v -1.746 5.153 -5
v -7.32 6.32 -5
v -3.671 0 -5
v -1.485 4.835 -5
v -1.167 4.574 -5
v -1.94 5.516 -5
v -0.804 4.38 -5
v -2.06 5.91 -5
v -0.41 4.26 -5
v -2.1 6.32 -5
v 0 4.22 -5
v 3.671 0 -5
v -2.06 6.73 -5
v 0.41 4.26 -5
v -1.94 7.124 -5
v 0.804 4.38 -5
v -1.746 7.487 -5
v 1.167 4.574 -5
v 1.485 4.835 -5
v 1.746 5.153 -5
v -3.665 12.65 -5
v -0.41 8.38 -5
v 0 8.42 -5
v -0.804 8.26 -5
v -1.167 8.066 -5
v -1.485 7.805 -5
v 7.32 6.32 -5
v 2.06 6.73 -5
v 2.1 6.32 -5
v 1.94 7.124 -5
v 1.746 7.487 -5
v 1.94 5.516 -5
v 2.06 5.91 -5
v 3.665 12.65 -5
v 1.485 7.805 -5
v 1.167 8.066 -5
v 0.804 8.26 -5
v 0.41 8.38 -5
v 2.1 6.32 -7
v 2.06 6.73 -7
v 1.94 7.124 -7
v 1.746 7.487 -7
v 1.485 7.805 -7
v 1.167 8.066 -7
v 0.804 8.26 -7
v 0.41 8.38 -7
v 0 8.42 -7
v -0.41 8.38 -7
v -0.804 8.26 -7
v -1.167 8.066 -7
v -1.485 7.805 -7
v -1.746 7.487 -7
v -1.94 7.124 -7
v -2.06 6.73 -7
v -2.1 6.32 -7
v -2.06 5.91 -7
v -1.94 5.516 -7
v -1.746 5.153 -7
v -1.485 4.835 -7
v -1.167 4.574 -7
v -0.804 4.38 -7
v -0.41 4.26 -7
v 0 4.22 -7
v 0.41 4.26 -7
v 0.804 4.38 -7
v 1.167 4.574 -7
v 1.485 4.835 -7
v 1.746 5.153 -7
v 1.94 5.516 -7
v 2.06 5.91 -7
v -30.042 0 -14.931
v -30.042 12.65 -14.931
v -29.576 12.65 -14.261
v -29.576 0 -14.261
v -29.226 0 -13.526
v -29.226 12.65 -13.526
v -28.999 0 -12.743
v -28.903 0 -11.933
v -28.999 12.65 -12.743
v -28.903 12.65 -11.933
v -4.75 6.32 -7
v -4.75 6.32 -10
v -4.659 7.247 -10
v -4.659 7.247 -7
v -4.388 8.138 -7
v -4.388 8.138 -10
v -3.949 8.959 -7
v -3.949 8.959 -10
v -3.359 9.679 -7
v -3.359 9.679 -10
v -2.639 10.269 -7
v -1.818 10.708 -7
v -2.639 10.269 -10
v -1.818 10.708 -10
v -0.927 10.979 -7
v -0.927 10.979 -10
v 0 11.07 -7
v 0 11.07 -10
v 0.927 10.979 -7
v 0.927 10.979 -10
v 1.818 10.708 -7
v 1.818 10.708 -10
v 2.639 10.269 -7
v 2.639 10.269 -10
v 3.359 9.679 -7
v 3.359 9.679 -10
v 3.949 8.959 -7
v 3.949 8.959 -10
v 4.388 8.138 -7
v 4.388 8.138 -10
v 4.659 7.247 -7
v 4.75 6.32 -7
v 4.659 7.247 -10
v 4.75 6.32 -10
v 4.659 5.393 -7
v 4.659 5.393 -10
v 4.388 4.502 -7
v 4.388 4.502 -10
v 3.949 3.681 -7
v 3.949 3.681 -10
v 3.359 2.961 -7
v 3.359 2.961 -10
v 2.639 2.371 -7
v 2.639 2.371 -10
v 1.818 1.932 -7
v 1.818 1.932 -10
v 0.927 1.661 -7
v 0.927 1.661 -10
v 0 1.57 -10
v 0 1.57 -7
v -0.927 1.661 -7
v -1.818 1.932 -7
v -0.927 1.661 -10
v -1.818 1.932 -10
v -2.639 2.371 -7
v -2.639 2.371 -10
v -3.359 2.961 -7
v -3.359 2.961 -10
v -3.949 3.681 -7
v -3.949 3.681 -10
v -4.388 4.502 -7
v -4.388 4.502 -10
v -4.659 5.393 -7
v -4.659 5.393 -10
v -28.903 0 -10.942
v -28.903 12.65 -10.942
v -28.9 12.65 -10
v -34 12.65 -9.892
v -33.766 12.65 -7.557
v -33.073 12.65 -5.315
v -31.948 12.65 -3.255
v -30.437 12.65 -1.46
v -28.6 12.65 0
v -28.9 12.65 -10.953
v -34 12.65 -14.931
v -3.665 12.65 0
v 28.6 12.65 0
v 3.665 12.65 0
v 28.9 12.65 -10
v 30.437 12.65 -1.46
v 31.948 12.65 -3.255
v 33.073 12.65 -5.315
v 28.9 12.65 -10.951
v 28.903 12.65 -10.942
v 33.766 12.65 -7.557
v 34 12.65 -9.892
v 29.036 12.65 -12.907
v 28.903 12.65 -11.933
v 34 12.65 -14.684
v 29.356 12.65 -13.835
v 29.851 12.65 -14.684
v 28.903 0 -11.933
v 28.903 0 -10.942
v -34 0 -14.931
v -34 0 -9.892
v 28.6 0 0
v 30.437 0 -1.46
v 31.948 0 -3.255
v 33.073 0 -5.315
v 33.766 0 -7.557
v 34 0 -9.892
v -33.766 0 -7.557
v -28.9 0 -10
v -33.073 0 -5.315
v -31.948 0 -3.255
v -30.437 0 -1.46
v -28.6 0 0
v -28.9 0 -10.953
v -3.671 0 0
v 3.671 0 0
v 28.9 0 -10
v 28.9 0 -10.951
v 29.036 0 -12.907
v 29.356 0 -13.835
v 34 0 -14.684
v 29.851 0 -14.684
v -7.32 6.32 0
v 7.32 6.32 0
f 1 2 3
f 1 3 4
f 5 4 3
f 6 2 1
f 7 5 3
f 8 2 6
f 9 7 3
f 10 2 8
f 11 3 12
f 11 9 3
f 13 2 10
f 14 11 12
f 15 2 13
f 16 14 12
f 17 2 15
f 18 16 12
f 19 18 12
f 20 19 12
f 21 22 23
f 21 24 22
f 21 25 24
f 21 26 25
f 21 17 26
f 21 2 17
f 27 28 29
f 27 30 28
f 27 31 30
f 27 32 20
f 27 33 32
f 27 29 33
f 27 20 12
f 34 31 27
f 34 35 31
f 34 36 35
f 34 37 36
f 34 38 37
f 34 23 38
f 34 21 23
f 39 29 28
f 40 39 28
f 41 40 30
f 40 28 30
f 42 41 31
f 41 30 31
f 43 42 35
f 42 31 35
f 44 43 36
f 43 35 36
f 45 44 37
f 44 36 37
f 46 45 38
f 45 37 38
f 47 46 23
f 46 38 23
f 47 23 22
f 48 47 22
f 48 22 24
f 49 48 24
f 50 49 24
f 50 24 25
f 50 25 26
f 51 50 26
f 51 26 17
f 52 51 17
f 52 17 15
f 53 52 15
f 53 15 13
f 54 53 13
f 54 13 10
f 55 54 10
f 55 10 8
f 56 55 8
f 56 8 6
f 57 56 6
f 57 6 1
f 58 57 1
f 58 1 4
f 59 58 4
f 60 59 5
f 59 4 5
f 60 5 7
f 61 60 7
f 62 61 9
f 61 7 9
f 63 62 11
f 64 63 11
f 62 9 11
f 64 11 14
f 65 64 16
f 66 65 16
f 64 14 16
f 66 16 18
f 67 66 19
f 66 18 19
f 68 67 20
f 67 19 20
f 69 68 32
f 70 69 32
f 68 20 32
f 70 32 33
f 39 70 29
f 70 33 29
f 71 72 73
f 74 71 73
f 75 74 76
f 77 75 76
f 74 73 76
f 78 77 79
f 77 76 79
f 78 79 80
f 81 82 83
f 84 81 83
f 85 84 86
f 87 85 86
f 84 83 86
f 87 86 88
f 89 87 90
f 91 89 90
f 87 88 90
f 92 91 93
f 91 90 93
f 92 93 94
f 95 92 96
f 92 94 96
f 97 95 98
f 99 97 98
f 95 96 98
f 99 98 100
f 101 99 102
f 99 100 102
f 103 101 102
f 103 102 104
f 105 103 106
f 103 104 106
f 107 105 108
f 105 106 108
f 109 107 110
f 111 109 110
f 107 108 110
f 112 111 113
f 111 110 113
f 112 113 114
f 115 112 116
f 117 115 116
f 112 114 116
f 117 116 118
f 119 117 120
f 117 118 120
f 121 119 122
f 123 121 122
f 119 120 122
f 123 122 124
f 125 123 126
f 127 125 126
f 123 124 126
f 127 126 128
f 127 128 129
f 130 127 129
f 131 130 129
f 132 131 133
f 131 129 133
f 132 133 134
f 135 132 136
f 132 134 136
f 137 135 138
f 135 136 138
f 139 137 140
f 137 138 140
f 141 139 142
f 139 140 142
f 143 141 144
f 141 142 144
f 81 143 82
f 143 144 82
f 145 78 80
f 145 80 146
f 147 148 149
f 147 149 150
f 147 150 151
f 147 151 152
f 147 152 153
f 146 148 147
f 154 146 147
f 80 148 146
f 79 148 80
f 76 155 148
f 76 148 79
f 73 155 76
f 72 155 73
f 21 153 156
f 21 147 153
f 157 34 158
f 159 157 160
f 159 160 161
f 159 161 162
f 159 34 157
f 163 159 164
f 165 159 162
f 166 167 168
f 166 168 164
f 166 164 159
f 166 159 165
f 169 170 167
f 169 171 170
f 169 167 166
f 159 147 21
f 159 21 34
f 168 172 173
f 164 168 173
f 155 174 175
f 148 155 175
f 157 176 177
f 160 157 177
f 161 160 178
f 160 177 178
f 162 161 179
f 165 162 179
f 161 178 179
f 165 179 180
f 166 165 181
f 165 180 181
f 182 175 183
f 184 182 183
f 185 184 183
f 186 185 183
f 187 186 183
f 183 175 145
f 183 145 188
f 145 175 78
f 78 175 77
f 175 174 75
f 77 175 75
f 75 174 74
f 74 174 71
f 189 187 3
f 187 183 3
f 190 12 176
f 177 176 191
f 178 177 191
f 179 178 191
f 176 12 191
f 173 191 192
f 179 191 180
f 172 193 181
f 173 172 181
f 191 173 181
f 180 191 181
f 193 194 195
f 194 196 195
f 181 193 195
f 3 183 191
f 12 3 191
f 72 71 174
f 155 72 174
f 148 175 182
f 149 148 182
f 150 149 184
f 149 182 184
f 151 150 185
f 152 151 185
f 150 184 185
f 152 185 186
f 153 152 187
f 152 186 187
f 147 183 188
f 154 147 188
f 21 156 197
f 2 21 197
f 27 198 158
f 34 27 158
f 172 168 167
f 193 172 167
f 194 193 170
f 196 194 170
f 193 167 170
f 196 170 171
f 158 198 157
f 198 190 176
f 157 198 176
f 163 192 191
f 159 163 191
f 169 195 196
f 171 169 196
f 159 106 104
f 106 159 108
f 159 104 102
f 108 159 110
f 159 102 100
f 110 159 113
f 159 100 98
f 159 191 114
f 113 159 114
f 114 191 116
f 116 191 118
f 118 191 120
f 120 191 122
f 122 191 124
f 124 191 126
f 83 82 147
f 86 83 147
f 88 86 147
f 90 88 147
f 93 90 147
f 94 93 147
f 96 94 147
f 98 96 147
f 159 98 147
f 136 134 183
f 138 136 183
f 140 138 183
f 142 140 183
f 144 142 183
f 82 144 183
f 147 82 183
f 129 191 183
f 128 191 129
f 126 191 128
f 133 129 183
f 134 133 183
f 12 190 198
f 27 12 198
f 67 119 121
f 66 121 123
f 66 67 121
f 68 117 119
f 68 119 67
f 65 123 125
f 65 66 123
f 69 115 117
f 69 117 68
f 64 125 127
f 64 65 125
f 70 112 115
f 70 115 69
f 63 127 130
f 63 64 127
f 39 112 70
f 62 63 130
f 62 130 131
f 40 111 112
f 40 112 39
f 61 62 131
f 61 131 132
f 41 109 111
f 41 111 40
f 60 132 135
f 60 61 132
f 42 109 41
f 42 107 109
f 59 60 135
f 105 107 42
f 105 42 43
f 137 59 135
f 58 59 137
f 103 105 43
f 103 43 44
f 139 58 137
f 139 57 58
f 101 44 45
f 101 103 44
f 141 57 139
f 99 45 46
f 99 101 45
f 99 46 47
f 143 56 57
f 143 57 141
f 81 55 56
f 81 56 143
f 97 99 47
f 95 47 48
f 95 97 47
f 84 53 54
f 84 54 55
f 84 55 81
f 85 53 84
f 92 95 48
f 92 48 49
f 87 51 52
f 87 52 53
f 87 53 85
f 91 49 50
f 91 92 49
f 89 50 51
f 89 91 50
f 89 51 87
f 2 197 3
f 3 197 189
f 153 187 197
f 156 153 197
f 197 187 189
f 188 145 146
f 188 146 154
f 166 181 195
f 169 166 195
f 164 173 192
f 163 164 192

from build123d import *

# Parameters (mm, degrees)
EXTRUDE_1_DEPTH     = 12.65
CUT_EXTRUDE_1_DEPTH = 5
SKETCH_3_R          = 4.75
CUT_EXTRUDE_2_DEPTH = 3
SKETCH_6_R          = 2.1
CUT_EXTRUDE_5_DEPTH = 10
FILLET_3_R          = 5
FILLET_4_R          = 5
FILLET_6_R          = 1
FILLET_7_R          = 1
CUT_EXTRUDE_6_DEPTH = 15


with BuildPart() as part:
    # 草图1 → 凸台-拉伸1 (new body)
    with BuildSketch(Plane(origin=(0, 0, 0), x_dir=(1, 0, 0), z_dir=(0, 1, 0))):
        with BuildLine():
            Line((-28.6, 0), (28.6, 0))
            ThreePointArc((28.6, 0), (32.562096374, 4.25705164), (34, 9.892043165))
            Line((34, 9.892043165), (34, 17.266133288))
            Line((34, 17.266133288), (28.9, 15))
            Line((28.9, 15), (28.9, 10))
            Line((28.9, 10), (-28.9, 10))
            Line((-28.9, 10), (-28.9, 15))
            Line((-28.9, 15), (-34, 17.266133288))
            Line((-34, 17.266133288), (-34, 9.892043165))
            ThreePointArc((-34, 9.892043165), (-32.562096374, 4.25705164), (-28.6, 0))
        make_face()
    extrude(amount=EXTRUDE_1_DEPTH)

    # 草图2 → 切除-拉伸1 (cut)
    with BuildSketch(Plane.XY):
        Polygon((-7.32, 6.32), (-3.66, -0.019305956), (3.66, -0.019305956), (7.32, 6.32), (3.66, 12.659305956), (-3.66, 12.659305956), align=None)
    extrude(amount=-CUT_EXTRUDE_1_DEPTH, mode=Mode.SUBTRACT)

    # 草图3 → 切除-拉伸2 (cut)
    with BuildSketch(Plane(origin=(0, 0, -10), x_dir=(-1, 0, 0), z_dir=(0, 0, -1))):
        with Locations((0, 6.32)):
            Circle(SKETCH_3_R)
    extrude(amount=-CUT_EXTRUDE_2_DEPTH, mode=Mode.SUBTRACT)

    # 草图6 → 切除-拉伸5 (cut)
    with BuildSketch(Plane.XY.offset(-5)):
        with Locations((0, 6.32)):
            Circle(SKETCH_6_R)
    extrude(amount=-CUT_EXTRUDE_5_DEPTH, mode=Mode.SUBTRACT)

    # 圆角3
    fillet_3_edges = [part.edges().sort_by_distance(p)[0] for p in [
        (-28.9, 6.325, -15),
    ]]
    fillet(fillet_3_edges, radius=FILLET_3_R)

    # 圆角4
    fillet_4_edges = [part.edges().sort_by_distance(p)[0] for p in [
        (28.9, 6.325, -15),
    ]]
    fillet(fillet_4_edges, radius=FILLET_4_R)

    # 圆角6
    fillet_6_edges = [part.edges().sort_by_distance(p)[0] for p in [
        (34, 6.325, -17.266133288),
    ]]
    fillet(fillet_6_edges, radius=FILLET_6_R)

    # 圆角7
    fillet_7_edges = [part.edges().sort_by_distance(p)[0] for p in [
        (-34, 6.325, -17.266133288),
    ]]
    fillet(fillet_7_edges, radius=FILLET_7_R)

    # 草图7 → 切除-拉伸6 (cut)
    with BuildSketch(Plane.XZ):
        Polygon((28.903354644, -10.942236709), (27.407544443, -14.683649227), (28.903354644, -17.343343862), (36.500549605, -19.187562633), (35.643870018, -14.683649227), (31.998035106, -14.683649227), (28.903354644, -14.683649227), align=None)
        Polygon((-28.903354644, -10.942236709), (-27.711217355, -14.930549055), (-28.903354644, -15.756236567), (-29.008862033, -15.781540844), (-34.951049449, -20.851021688), (-36.720724333, -14.930549055), (-32.176496035, -14.930549055), (-28.903354644, -14.930549055), align=None)
    extrude(amount=-CUT_EXTRUDE_6_DEPTH, mode=Mode.SUBTRACT)


solid = part.part
